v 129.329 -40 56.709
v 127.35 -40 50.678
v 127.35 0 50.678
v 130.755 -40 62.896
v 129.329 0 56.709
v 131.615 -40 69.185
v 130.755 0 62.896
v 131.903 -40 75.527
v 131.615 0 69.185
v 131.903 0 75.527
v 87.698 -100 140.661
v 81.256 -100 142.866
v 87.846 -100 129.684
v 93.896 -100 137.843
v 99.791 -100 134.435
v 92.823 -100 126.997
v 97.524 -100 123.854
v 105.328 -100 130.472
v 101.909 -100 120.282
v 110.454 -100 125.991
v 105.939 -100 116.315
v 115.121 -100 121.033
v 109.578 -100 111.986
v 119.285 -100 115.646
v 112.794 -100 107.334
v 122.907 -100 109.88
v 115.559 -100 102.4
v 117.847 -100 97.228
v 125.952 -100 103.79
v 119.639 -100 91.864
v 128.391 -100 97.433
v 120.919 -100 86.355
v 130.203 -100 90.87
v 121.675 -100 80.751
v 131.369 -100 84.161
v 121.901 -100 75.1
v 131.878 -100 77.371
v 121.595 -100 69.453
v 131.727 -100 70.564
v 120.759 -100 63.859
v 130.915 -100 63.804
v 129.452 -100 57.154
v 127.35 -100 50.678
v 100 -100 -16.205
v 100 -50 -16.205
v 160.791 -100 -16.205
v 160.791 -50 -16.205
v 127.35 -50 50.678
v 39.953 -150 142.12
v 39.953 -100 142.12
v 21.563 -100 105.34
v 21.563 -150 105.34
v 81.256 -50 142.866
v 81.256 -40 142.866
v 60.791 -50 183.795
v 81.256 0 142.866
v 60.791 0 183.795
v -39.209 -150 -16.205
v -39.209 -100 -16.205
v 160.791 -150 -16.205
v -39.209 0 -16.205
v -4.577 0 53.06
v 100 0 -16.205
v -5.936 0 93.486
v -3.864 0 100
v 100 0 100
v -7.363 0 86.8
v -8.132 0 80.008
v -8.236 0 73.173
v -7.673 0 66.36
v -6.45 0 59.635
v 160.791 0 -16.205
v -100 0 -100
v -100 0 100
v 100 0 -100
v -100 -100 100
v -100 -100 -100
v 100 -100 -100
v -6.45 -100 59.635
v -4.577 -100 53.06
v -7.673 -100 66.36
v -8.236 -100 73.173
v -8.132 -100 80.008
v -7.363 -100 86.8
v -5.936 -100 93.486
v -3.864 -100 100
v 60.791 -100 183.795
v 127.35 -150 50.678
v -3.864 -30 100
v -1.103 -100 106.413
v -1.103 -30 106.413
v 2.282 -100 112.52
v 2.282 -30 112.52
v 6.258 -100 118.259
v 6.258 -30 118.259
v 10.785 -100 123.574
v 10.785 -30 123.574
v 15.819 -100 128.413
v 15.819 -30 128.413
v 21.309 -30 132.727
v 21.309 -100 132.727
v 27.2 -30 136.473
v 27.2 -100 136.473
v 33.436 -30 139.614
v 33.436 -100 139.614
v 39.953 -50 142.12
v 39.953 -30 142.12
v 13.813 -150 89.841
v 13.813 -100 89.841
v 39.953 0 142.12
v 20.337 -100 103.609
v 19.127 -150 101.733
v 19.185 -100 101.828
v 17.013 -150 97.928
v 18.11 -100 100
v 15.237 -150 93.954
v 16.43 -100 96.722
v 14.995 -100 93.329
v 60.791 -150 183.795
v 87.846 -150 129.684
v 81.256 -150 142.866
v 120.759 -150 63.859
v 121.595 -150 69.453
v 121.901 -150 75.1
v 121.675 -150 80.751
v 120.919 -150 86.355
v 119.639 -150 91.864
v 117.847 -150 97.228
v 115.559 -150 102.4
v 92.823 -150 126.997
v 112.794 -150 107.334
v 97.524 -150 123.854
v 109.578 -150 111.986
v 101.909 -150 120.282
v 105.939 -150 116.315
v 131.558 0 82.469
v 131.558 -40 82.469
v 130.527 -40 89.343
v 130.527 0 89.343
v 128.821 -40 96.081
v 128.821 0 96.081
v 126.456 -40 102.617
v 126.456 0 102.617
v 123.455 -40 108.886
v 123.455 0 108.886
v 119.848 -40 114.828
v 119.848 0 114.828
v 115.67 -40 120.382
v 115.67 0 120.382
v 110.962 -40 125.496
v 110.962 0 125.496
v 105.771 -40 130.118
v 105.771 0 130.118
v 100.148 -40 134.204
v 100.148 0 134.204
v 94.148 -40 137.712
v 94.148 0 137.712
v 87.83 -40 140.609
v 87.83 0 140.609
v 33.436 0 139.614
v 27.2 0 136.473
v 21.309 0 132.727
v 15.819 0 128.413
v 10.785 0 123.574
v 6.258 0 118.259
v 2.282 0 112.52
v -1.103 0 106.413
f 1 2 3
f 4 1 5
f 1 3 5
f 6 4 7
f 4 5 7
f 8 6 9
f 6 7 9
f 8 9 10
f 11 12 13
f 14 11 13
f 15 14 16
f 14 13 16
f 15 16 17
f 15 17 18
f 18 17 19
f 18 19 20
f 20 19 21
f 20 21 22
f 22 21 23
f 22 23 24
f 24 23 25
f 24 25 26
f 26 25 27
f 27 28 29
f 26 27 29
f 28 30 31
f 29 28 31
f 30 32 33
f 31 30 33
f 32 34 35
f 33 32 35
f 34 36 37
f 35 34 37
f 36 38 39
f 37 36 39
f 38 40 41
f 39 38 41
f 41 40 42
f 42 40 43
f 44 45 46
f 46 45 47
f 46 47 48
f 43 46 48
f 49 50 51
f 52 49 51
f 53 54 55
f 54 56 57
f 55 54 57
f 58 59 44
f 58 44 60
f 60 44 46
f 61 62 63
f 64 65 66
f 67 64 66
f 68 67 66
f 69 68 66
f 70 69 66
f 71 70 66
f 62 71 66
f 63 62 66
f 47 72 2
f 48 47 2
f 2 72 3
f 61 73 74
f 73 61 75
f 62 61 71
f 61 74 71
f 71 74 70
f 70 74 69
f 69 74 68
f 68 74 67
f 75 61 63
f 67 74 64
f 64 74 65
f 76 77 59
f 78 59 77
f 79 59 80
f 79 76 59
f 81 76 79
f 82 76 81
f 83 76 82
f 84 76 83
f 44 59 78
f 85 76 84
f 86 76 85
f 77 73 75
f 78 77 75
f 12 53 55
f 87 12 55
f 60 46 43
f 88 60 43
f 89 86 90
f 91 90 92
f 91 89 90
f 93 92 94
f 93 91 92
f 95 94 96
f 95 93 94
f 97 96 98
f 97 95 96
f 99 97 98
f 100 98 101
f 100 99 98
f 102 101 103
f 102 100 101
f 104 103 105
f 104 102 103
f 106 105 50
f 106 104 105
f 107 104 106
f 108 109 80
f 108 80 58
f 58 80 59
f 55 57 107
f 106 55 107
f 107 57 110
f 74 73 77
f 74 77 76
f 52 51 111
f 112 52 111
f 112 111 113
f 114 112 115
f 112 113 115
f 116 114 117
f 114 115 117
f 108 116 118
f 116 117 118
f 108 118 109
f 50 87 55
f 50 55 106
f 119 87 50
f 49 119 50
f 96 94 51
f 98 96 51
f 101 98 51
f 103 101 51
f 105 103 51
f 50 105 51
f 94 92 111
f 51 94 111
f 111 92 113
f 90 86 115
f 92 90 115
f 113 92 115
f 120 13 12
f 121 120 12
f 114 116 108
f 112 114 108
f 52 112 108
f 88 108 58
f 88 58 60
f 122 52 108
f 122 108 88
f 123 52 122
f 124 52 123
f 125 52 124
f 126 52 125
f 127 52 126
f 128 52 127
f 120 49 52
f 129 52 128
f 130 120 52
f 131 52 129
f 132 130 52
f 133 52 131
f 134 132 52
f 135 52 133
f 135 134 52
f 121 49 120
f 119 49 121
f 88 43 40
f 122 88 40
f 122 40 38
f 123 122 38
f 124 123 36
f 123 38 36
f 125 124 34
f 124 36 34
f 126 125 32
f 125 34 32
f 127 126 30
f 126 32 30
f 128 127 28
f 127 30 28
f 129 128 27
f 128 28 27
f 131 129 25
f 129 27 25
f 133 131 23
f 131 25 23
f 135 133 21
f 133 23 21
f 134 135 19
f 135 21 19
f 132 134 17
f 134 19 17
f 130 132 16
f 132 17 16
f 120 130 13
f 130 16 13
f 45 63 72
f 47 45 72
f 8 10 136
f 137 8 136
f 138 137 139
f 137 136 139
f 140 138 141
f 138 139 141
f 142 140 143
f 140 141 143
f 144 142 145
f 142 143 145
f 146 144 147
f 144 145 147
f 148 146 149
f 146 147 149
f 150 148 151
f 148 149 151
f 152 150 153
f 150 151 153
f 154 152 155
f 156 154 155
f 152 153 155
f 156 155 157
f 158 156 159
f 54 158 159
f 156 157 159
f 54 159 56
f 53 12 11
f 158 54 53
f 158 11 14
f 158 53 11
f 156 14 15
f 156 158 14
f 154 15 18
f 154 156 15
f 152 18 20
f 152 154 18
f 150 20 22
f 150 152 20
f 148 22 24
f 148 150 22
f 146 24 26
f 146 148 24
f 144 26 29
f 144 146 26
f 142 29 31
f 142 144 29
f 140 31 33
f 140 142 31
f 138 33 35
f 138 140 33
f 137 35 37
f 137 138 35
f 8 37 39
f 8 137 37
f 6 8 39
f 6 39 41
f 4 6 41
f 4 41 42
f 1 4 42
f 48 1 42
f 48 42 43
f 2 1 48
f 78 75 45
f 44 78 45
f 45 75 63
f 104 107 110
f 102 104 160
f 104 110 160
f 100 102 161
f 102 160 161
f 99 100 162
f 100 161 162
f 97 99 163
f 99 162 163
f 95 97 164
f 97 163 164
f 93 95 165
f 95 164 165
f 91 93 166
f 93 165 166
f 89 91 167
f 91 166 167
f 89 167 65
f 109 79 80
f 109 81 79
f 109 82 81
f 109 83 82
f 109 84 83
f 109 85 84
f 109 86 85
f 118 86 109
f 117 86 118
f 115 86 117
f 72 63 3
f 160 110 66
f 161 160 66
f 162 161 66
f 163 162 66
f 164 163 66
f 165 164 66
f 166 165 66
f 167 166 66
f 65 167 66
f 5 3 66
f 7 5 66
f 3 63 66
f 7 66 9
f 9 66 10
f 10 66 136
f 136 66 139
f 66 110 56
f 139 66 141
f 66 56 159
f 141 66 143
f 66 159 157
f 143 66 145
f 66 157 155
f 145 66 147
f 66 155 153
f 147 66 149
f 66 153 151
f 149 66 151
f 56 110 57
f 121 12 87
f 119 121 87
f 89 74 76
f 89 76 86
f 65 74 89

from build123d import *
from build123d import SkipClean  # not in build123d's __all__

# Parameters (mm, degrees)
F1_DEPTH = 50
F2_R     = 10
F3_R     = 20
F4_W     = 200
F4_H     = 200
F5_DEPTH = 100


with BuildPart() as f1:
    # F0 (on Front) → F1 (new body)
    with BuildSketch(Plane.XZ):
        with BuildLine():
            Line((-4.5768408876, 53.0602382816), (-39.2092391849, -16.2045583129))
            Line((-39.2092391849, -16.2045583129), (160.7907608151, -16.2045583129))
            Line((160.7907608151, -16.2045583129), (127.34963023, 50.6777028574))
            ThreePointArc((127.34963023, 50.6777028574), (60.5480822774, 5.4496834996), (-4.5768408876, 53.0602382816))
        make_face()
        with BuildLine():
            ThreePointArc((39.9529426198, 142.1198052965), (-0.8758229979, 106.8719587211), (-4.5768408876, 53.0602382816))
            Line((-4.5768408876, 53.0602382816), (39.9529426198, 142.1198052965))
        make_face()
        with BuildLine():
            Line((39.9529426198, 142.1198052965), (-4.5768408876, 53.0602382816))
            ThreePointArc((-4.5768408876, 53.0602382816), (60.5480822774, 5.4496834996), (127.34963023, 50.6777028574))
            Line((127.34963023, 50.6777028574), (81.2556246585, 142.8657140004))
            ThreePointArc((81.2556246585, 142.8657140004), (60.5480822774, 145.6047584293), (39.9529426198, 142.1198052965))
        make_face()
        with BuildLine():
            Line((81.2556246585, 142.8657140004), (127.34963023, 50.6777028574))
            ThreePointArc((127.34963023, 50.6777028574), (130.7549744187, 62.8956312233), (131.9026168762, 75.5272209644))
            ThreePointArc((131.9026168762, 75.5272209644), (117.8276267442, 117.6567547414), (81.2556246585, 142.8657140004))
        make_face()
        with BuildLine():
            Line((60.7907608151, 183.7954416871), (39.9529426198, 142.1198052965))
            ThreePointArc((39.9529426198, 142.1198052965), (60.5480822774, 145.6047584293), (81.2556246585, 142.8657140004))
            Line((81.2556246585, 142.8657140004), (60.7907608151, 183.7954416871))
        make_face()
    extrude(amount=F1_DEPTH)

    # F2
    f2_edges = [f1.edges().sort_by_distance(p)[0] for p in [
        (124.503128, -50, 106.871959),
    ]]
    fillet(f2_edges, radius=F2_R)

    # F3
    f3_edges = [f1.edges().sort_by_distance(p)[0] for p in [
        (-0.875823, -50, 106.871959),
    ]]
    fillet(f3_edges, radius=F3_R)

    # F4 (on Front) + F1_face (on face) + F1_face1 (on face) → F5 (join)
    with BuildSketch(Plane.XZ):
        Rectangle(F4_W, F4_H)
    with BuildSketch(Plane(origin=(62.2431161931, -50, 51.9688897251), x_dir=(1, 0, 0), z_dir=(0, -1, 0))):
        with BuildLine():
            Line((-22.2901735733, 90.1509155714), (-40.6803150229, 53.3706326721))
            ThreePointArc((-40.6803150229, 53.3706326721), (-45.230395371, 45.958797086), (-48.429815631, 37.8716314558))
            Line((-48.429815631, 37.8716314558), (-66.8199570807, 1.0913485565))
            Line((-66.8199570807, 1.0913485565), (-101.452355378, -68.173448038))
            Line((-101.452355378, -68.173448038), (98.547644622, -68.173448038))
            Line((98.547644622, -68.173448038), (65.1065140369, -1.2911868678))
            Line((65.1065140369, -1.2911868678), (58.5157708494, 11.8902995073))
            ThreePointArc((58.5157708494, 11.8902995073), (53.3157399256, 50.430933041), (25.603251653, 77.7153379001))
            Line((25.603251653, 77.7153379001), (19.0125084654, 90.8968242752))
            Line((19.0125084654, 90.8968242752), (-1.452355378, 131.826551962))
            Line((-1.452355378, 131.826551962), (-22.2901735733, 90.1509155714))
        make_face()
    with BuildSketch(Plane(origin=(61.2741122872, 0, 57.1327908737), x_dir=(1, 0, 0), z_dir=(0, 1, 0))):
        with BuildLine():
            Line((-100.4833514721, 73.3373491866), (-65.8509531748, 4.072552592))
            ThreePointArc((-65.8509531748, 4.072552592), (-62.1499352851, -49.7391678474), (-21.3211696674, -84.9870144228))
            Line((-21.3211696674, -84.9870144228), (-0.4833514721, -126.6626508134))
            Line((-0.4833514721, -126.6626508134), (19.9815123713, -85.7329231267))
            ThreePointArc((19.9815123713, -85.7329231267), (63.2290157415, -49.7391678474), (66.0755179428, 6.4550880163))
            Line((66.0755179428, 6.4550880163), (99.5166485279, 73.3373491866))
            Line((99.5166485279, 73.3373491866), (-100.4833514721, 73.3373491866))
        make_face()
    with SkipClean():  # cleaning this boolean's faces spoils the solid; the shape is the same uncleaned
        extrude(amount=F5_DEPTH, dir=(0, -1, 0))


solid = f1.part
